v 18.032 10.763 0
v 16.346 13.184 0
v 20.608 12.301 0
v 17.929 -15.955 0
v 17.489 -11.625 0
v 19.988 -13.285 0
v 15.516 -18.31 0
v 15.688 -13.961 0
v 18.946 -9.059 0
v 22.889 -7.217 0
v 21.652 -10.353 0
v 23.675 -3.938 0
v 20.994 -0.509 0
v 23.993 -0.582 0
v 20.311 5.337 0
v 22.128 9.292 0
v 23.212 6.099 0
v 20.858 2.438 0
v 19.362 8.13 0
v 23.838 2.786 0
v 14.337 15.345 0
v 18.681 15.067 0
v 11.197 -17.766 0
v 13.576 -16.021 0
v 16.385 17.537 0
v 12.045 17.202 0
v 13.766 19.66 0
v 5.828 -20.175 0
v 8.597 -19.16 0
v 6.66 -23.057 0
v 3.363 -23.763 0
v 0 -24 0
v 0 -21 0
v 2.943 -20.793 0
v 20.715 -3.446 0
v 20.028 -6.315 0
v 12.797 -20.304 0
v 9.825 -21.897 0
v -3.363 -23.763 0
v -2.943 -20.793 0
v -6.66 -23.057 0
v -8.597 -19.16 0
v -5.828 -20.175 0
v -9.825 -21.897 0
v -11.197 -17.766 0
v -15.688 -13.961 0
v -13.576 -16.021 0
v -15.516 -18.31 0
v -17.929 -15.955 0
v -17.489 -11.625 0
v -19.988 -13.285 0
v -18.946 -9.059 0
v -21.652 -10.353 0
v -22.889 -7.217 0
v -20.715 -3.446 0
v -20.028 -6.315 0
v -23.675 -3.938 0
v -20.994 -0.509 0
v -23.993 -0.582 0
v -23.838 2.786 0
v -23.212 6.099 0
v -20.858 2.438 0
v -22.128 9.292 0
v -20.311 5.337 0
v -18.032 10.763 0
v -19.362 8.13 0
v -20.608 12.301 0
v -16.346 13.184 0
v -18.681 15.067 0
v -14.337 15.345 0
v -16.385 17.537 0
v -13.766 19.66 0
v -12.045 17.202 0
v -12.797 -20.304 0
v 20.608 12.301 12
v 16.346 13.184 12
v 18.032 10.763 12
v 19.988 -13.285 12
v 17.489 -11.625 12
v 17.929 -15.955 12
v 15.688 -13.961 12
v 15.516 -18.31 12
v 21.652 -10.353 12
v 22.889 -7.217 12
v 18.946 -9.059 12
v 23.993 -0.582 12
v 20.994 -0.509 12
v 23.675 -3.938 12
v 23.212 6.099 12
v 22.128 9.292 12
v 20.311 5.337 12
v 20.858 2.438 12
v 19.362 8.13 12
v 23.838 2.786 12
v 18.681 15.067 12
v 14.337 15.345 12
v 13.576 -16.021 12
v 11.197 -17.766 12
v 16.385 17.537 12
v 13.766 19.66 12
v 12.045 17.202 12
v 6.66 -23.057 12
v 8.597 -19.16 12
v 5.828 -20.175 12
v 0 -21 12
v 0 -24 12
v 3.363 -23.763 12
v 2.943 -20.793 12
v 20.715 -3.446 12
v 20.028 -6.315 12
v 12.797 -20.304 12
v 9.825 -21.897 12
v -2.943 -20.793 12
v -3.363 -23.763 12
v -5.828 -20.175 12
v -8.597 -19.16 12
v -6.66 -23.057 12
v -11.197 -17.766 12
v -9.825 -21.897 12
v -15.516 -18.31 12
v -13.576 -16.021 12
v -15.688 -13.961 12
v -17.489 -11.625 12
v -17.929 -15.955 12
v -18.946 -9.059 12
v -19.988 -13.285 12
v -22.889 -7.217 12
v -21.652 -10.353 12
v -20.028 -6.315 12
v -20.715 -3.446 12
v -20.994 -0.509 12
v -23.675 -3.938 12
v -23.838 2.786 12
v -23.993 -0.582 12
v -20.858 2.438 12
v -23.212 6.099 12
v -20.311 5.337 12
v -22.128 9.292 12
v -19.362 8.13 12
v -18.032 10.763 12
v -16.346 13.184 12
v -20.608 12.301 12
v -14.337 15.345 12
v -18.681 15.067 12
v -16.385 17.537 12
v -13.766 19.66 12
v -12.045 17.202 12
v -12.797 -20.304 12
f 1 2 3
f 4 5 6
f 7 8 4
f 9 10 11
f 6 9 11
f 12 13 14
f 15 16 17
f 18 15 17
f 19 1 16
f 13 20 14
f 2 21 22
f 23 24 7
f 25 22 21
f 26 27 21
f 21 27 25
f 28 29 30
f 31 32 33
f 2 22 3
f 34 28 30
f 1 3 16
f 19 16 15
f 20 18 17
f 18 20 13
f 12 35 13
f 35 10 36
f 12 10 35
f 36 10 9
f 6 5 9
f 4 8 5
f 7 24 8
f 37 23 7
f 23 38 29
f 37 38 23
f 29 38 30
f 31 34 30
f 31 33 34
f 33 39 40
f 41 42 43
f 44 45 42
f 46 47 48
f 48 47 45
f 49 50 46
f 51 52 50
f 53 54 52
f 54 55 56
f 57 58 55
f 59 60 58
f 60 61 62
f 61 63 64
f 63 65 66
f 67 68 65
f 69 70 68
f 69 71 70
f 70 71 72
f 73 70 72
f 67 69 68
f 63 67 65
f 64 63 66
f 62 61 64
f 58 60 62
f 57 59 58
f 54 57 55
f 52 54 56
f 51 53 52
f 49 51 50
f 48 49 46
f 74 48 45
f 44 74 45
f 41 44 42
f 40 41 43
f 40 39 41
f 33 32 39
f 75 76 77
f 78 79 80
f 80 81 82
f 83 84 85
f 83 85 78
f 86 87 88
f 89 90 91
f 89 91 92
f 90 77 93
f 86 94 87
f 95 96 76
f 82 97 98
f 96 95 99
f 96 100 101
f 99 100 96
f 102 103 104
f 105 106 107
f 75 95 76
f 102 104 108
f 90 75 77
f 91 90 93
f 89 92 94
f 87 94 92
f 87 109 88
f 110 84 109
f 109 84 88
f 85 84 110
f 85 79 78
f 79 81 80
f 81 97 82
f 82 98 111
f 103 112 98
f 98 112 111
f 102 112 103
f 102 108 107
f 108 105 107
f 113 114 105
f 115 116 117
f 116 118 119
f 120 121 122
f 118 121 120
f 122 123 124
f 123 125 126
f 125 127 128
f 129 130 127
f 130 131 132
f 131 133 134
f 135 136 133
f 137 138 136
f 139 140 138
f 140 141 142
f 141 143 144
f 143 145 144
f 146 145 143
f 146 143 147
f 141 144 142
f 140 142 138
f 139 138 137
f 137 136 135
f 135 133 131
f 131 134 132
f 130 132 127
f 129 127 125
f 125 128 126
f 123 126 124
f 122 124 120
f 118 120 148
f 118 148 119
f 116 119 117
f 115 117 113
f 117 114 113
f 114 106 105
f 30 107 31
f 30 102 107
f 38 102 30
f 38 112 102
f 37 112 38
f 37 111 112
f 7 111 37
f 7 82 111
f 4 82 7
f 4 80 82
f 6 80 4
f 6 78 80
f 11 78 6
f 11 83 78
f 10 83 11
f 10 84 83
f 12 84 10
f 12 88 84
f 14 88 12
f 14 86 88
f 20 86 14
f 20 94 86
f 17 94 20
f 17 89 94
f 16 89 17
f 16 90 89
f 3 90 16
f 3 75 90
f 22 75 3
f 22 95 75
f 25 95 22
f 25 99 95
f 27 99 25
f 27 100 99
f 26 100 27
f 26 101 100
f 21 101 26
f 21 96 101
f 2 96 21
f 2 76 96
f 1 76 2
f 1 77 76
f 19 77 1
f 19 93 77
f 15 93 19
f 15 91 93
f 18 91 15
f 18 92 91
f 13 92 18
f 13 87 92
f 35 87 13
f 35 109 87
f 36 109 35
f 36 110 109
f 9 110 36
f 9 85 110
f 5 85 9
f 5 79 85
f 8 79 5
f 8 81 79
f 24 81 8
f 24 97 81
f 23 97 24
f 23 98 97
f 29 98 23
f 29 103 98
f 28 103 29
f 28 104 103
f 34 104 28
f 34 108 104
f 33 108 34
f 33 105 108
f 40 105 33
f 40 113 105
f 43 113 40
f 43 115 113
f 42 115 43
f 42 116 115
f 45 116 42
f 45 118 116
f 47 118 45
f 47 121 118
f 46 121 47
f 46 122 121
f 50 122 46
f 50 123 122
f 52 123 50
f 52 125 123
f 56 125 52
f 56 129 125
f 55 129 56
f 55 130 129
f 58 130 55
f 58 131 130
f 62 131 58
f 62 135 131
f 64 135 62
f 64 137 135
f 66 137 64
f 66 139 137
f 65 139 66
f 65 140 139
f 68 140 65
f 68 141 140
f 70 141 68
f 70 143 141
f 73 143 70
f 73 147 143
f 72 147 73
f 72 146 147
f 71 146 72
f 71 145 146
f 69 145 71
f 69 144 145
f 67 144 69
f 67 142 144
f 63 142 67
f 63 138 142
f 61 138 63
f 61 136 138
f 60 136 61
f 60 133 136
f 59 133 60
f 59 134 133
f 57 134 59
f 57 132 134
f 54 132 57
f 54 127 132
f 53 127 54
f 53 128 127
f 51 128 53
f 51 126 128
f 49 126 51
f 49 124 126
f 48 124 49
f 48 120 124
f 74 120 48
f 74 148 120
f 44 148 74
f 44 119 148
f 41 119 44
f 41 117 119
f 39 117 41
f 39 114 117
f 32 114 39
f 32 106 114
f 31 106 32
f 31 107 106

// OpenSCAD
$fn = 32;

// ----------------------------------------------------------------------
// Spring clip: 48 mm outside, 3 mm band, 70 degree opening
// ----------------------------------------------------------------------

// --- parameters (mm) ---
outer_r = 24;             // clip outside radius
inner_r = 21;             // clip bore radius
band = 3;                 // band thickness
clip_w = 12;              // clip width
opening = 70;             // opening angle

clip_profile = [[-13.766, 19.66], [-16.385, 17.537], [-18.681, 15.067], [-20.608, 12.301], [-22.128, 9.292], [-23.212, 6.099], [-23.838, 2.786], [-23.993, -0.582], [-23.675, -3.938], [-22.889, -7.217], [-21.652, -10.353], [-19.988, -13.285], [-17.929, -15.955], [-15.516, -18.31], [-12.797, -20.304], [-9.825, -21.897], [-6.66, -23.057], [-3.363, -23.763], [0, -24], [3.363, -23.763], [6.66, -23.057], [9.825, -21.897], [12.797, -20.304], [15.516, -18.31], [17.929, -15.955], [19.988, -13.285], [21.652, -10.353], [22.889, -7.217], [23.675, -3.938], [23.993, -0.582], [23.838, 2.786], [23.212, 6.099], [22.128, 9.292], [20.608, 12.301], [18.681, 15.067], [16.385, 17.537], [13.766, 19.66], [12.045, 17.202], [14.337, 15.345], [16.346, 13.184], [18.032, 10.763], [19.362, 8.13], [20.311, 5.337], [20.858, 2.438], [20.994, -0.509], [20.715, -3.446], [20.028, -6.315], [18.946, -9.059], [17.489, -11.625], [15.688, -13.961], [13.576, -16.021], [11.197, -17.766], [8.597, -19.16], [5.828, -20.175], [2.943, -20.793], [0, -21], [-2.943, -20.793], [-5.828, -20.175], [-8.597, -19.16], [-11.197, -17.766], [-13.576, -16.021], [-15.688, -13.961], [-17.489, -11.625], [-18.946, -9.059], [-20.028, -6.315], [-20.715, -3.446], [-20.994, -0.509], [-20.858, 2.438], [-20.311, 5.337], [-19.362, 8.13], [-18.032, 10.763], [-16.346, 13.184], [-14.337, 15.345], [-12.045, 17.202]];

difference() {
  union() {
    linear_extrude(height = clip_w) polygon(clip_profile);
  }
}
